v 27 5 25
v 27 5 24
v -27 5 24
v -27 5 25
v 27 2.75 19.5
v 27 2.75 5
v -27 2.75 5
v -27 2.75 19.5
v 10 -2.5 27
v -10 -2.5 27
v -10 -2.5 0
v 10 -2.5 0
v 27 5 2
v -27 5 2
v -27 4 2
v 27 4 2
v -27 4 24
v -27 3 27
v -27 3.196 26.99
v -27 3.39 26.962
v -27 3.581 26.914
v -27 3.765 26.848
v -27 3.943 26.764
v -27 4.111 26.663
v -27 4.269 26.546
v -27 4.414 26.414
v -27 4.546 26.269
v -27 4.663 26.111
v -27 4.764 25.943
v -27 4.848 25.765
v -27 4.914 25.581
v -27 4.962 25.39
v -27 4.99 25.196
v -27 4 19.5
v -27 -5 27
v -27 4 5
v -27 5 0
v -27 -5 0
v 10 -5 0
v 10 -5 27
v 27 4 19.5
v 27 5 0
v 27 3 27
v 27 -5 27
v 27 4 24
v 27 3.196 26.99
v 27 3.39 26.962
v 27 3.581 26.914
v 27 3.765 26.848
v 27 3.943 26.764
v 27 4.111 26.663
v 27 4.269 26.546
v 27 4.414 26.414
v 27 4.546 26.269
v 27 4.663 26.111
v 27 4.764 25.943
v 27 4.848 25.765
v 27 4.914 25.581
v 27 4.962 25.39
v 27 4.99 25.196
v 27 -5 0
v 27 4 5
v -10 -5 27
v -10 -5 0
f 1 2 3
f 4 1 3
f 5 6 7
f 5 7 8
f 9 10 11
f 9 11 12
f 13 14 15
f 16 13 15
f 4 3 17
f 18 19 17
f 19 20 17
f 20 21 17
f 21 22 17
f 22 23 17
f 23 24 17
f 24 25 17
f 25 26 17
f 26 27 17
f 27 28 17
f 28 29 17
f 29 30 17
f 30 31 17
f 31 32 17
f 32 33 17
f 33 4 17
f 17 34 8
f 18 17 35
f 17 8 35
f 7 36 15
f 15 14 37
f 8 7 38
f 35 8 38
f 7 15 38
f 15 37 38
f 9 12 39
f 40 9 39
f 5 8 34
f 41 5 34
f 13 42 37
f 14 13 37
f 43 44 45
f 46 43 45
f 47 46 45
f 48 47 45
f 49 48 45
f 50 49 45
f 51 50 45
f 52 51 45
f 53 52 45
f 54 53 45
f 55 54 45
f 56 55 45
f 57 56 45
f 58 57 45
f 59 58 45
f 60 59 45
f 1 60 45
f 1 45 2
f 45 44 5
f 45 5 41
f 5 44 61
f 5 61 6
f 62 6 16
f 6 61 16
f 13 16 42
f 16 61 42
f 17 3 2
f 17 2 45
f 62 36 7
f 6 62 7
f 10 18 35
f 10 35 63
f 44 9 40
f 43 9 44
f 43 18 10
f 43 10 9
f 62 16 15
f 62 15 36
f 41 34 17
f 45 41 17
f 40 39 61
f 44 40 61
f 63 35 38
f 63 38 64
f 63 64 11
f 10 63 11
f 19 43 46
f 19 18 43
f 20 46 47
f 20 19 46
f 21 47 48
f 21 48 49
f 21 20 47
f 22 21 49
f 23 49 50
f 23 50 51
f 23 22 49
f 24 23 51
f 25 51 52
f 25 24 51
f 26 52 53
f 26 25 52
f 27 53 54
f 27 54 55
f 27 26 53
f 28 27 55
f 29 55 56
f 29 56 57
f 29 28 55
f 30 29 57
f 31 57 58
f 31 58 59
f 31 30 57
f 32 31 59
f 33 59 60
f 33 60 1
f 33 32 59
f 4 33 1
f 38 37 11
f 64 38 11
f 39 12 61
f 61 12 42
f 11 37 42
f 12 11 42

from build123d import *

# Parameters (mm, degrees)
F1_DEPTH = 27
F2_W     = 1
F2_H     = 14.5
F2_W_2   = 1.25
F2_H_2   = 3
F2_H_3   = 4.5
F3_DEPTH = 75
F4_R     = 2


with BuildPart() as f1:
    # F0 (on Top) → F1 (new body)
    with BuildSketch(Plane.XY):
        Polygon((10, -5), (27, -5), (27, 5), (-27, 5), (-27, -5), (-10, -5), (-10, -2.5), (10, -2.5), align=None)
    extrude(amount=F1_DEPTH)

    # F2 (on face) → F3 (cut)
    with BuildSketch(Plane(origin=(-27, 0, 0), x_dir=(0, -1, 0), z_dir=(-1, 0, 0))):
        with Locations((-4.5, 12.25)):
            Rectangle(F2_W, F2_H)
        with Locations((-3.375, 12.25)):
            Rectangle(F2_W_2, F2_H)
        with Locations((-4.5, 3.5)):
            Rectangle(F2_W, F2_H_2)
        with Locations((-4.5, 21.75)):
            Rectangle(F2_W, F2_H_3)
    extrude(amount=-F3_DEPTH, mode=Mode.SUBTRACT)

    # F4
    f4_edges = [f1.edges().sort_by_distance(p)[0] for p in [
        (0, 5, 27),
    ]]
    fillet(f4_edges, radius=F4_R)


solid = f1.part
